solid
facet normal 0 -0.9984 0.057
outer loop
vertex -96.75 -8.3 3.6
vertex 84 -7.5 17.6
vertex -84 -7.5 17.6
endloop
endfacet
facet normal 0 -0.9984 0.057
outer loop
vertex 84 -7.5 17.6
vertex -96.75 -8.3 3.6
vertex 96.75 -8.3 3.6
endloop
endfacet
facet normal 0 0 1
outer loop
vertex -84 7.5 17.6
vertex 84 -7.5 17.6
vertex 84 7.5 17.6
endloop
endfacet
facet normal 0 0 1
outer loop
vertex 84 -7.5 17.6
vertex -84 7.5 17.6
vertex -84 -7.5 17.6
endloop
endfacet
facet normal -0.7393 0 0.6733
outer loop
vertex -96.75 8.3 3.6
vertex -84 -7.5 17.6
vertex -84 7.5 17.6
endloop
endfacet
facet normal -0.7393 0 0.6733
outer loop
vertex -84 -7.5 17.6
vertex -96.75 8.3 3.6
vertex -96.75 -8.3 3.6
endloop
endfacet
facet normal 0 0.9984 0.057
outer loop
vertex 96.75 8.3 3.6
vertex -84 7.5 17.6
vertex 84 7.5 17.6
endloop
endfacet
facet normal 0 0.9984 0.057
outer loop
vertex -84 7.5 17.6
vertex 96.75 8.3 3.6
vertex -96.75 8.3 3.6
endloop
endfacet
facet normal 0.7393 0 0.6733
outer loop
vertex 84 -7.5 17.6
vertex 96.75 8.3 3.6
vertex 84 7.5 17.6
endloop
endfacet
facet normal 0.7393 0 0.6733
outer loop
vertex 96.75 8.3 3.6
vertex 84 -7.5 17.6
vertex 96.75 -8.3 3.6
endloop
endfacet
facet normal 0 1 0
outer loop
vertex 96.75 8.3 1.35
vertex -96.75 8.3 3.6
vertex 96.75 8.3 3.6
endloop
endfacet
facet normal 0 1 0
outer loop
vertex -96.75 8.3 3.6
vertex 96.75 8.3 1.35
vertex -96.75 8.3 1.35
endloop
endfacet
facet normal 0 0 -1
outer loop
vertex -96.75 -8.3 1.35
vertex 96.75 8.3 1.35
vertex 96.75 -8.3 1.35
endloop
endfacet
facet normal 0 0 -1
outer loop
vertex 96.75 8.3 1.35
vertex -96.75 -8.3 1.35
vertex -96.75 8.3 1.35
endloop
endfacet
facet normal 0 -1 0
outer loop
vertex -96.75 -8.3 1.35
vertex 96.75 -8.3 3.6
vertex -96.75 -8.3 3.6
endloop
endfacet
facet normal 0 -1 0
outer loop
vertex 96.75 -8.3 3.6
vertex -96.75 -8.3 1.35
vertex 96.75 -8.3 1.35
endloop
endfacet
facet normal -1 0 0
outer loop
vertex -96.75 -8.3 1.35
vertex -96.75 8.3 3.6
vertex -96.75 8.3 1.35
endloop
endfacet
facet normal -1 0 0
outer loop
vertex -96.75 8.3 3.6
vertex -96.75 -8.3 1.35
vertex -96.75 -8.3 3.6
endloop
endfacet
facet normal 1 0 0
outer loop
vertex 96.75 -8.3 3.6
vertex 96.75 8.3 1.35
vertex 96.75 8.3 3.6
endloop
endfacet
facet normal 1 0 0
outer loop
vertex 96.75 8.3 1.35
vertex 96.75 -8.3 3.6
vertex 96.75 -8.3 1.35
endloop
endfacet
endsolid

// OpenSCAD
$fn = $preview ? 50 : 140;
EPSILON = 0.01;

module copy_mirror(vec) {
  children();
  mirror(vec) children();
}

module copy_rotate(vec) {
  children();
  rotate(vec) children();
}

LID_THICKNESS = 3.6;
LID_EDGE_THICKNESS = 1.35;
LID_DIAMETER = 249;
LID_CHAMFER_LENGTH = 5.4;
LID_CHAMFER_THICKNESS = LID_THICKNESS - LID_EDGE_THICKNESS;

HANDLE_BOTTOM_LENGTH = 193.5;
HANDLE_TOP_LENGTH = 168;
HANDLE_HEIGHT = 14;
HANDLE_BOTTOM_WIDTH = 16.6;
HANDLE_TOP_WIDTH = 15;
HANDLE_LENGTH_DIFF = (HANDLE_BOTTOM_LENGTH - HANDLE_TOP_LENGTH) / 2;
HANDLE_WIDTH_DIFF = (HANDLE_BOTTOM_WIDTH - HANDLE_TOP_WIDTH) / 2;

// Top lid
module lid() {
  cylinder(h = LID_EDGE_THICKNESS, d = LID_DIAMETER);
  translate([ 0, 0, LID_EDGE_THICKNESS ])
      cylinder(h = LID_THICKNESS, d1 = LID_DIAMETER,
               d2 = LID_DIAMETER - LID_CHAMFER_LENGTH * 2);
}

HandlePoints = [
  [ 0, 0, 0 ],                                               // 0
  [ 0, HANDLE_BOTTOM_LENGTH, 0 ],                            // 1
  [ HANDLE_BOTTOM_WIDTH, HANDLE_BOTTOM_LENGTH, 0 ],          // 2
  [ HANDLE_BOTTOM_WIDTH, 0, 0 ],                             // 3
  [ HANDLE_WIDTH_DIFF, HANDLE_LENGTH_DIFF, HANDLE_HEIGHT ],  // 4
  [
    HANDLE_WIDTH_DIFF, HANDLE_BOTTOM_LENGTH - HANDLE_LENGTH_DIFF,
    HANDLE_HEIGHT
  ],  // 5
  [
    HANDLE_TOP_WIDTH + HANDLE_WIDTH_DIFF,
    HANDLE_BOTTOM_LENGTH - HANDLE_LENGTH_DIFF,
    HANDLE_HEIGHT
  ],  // 6
  [ HANDLE_TOP_WIDTH + HANDLE_WIDTH_DIFF, HANDLE_LENGTH_DIFF, HANDLE_HEIGHT ]
];  // 7

HandleFaces = [
  [ 0, 1, 2, 3 ],  // bottom
  [ 4, 5, 1, 0 ],  // front
  [ 7, 6, 5, 4 ],  // top
  [ 5, 6, 2, 1 ],  // right
  [ 6, 7, 3, 2 ],  // back
  [ 7, 4, 0, 3 ]
];  // left

// Lid handle (inset into the lid so it can be super glued in place)
module handle() {
  translate([ 0, 0, LID_THICKNESS ]) {
    rotate([ 0, 0, 90 ]) {
      translate([ HANDLE_BOTTOM_WIDTH / -2, HANDLE_BOTTOM_LENGTH / -2, 0 ]) {
        polyhedron(HandlePoints, HandleFaces);
        translate([ 0, 0, -LID_CHAMFER_THICKNESS ]) cube([
          HANDLE_BOTTOM_WIDTH, HANDLE_BOTTOM_LENGTH,
          LID_CHAMFER_THICKNESS
        ]);
      }
    }
  }
}

BOTTOM_CIRCLE_THICKNESS = 2.6;
BOTTOM_CIRCLE_DIAMETER = 196;
BOTTOM_CIRCLE_INNER_DIAMETER =
    BOTTOM_CIRCLE_DIAMETER - BOTTOM_CIRCLE_THICKNESS * 2;
BOTTOM_CIRCLE_HEIGHT = 18;

BOTTOM_DIVIDER_LINE_THICKNESS = 1.9;
BOTTOM_DIVIDER_LINE_HEIGHT = 8.6;

module bottom_circle() {
  // bottom circle
  translate([ 0, 0, -BOTTOM_CIRCLE_HEIGHT / 2 ]) {
    difference() {
      cylinder(h = BOTTOM_CIRCLE_HEIGHT, d = BOTTOM_CIRCLE_DIAMETER,
               center = true);
      cylinder(h = BOTTOM_CIRCLE_HEIGHT + 0.01,
               d = BOTTOM_CIRCLE_INNER_DIAMETER, center = true);
    }
  }

  SMALL_TAB_OUTER_OFFSET = 17.8;
  SMALL_TAB_CENTER_OFFSET =
      BOTTOM_CIRCLE_INNER_DIAMETER / 2 - SMALL_TAB_OUTER_OFFSET;
  SMALL_TAB_LENGTH = 5.1;
  SMALL_TAB_HEIGHT = 13.6;

  // divider line
  difference() {
    translate([ 0, 0, -BOTTOM_DIVIDER_LINE_HEIGHT / 2 ]) {
      cube(
          [
            BOTTOM_DIVIDER_LINE_THICKNESS,
            BOTTOM_CIRCLE_DIAMETER - BOTTOM_CIRCLE_THICKNESS / 2,
            BOTTOM_DIVIDER_LINE_HEIGHT
          ],
          center = true);
    }
    // remove holes
    translate([ 0, 0, -CENTER_HOLE_HEIGHT / 2 ])
        cylinder(h = CENTER_HOLE_HEIGHT + 0.01, d = CENTER_HOLE_INNER_DIAMETER,
                 center = true);
    translate([ 0, SIDE_HOLE_CENTER_OFFSET, SIDE_HOLE_HEIGHT / -2 ])
        cylinder(h = SIDE_HOLE_HEIGHT + 0.01, d = SIDE_HOLE_INNER_DIAMETER,
                 center = true);
  }

  // Small tab next to side hole
  translate([
    0, SMALL_TAB_LENGTH / -2 + SMALL_TAB_CENTER_OFFSET, SMALL_TAB_HEIGHT / -2
  ]) cube([ BOTTOM_DIVIDER_LINE_THICKNESS, SMALL_TAB_LENGTH, SMALL_TAB_HEIGHT ],
          center = true);

  CENTER_HOLE_DIAMETER = 8.46;
  CENTER_HOLE_INNER_DIAMETER = 3.35;
  CENTER_HOLE_HEIGHT = 12.5;

  translate([ 0, 0, -CENTER_HOLE_HEIGHT / 2 ]) {
    difference() {
      cylinder(h = CENTER_HOLE_HEIGHT, d = CENTER_HOLE_DIAMETER, center = true);
      cylinder(h = CENTER_HOLE_HEIGHT + 0.01, d = CENTER_HOLE_INNER_DIAMETER,
               center = true);
    }
  }

  SIDE_HOLE_OUTER_OFFSET = 25.2;
  SIDE_HOLE_CENTER_OFFSET =
      BOTTOM_CIRCLE_INNER_DIAMETER / 2 - SIDE_HOLE_OUTER_OFFSET;
  SIDE_HOLE_DIAMETER = 8;
  SIDE_HOLE_INNER_DIAMETER = 3.35;
  SIDE_HOLE_HEIGHT = 12.29;

  translate([ 0, SIDE_HOLE_CENTER_OFFSET, SIDE_HOLE_HEIGHT / -2 ])
      difference() {
    cylinder(h = SIDE_HOLE_HEIGHT, d = SIDE_HOLE_DIAMETER, center = true);
    cylinder(h = SIDE_HOLE_HEIGHT + 0.01, d = SIDE_HOLE_INNER_DIAMETER,
             center = true);
  }

  // 4x locking tabs

  LOCK_TAB_WIDTH = 10.6;
  LOCK_TAB_EXTRUSION_WIDTH = LOCK_TAB_WIDTH * 5;
  LOCK_TAB_THICKNESS = 2.5;
  LOCK_TAB_LEFT_HEIGHT = 5;
  LOCK_TAB_LEFT_LENGTH = 4.2;

  LOCK_TAB_LEFT_MAX_Z = 8.03;
  LOCK_TAB_MIDDLE_MAX_Z = 6.3;
  LOCK_TAB_MIDDLE_Z_OFFSET = LOCK_TAB_LEFT_MAX_Z - LOCK_TAB_MIDDLE_MAX_Z;

  LOCK_TAB_MIDDLE_LENGTH = 54;
  LOCK_TAB_RIGHT_MAX_Z = 4.4;
  LOCK_TAB_RIGHT_LENGTH = 9.9;

  LOCK_TAB_RIGHT_Z_OFFSET = LOCK_TAB_MIDDLE_MAX_Z - LOCK_TAB_RIGHT_MAX_Z;

  LOCK_TAB_MIDDLE_X1 = LOCK_TAB_LEFT_LENGTH;
  LOCK_TAB_MIDDLE_X2 = LOCK_TAB_MIDDLE_X1 + LOCK_TAB_MIDDLE_LENGTH;
  LOCK_TAB_MIDDLE_Y1 = LOCK_TAB_LEFT_HEIGHT;
  LOCK_TAB_MIDDLE_Y2 = LOCK_TAB_MIDDLE_Y1 + LOCK_TAB_MIDDLE_Z_OFFSET;

  LOCK_TAB_RIGHT_X1 = LOCK_TAB_MIDDLE_X1 + LOCK_TAB_MIDDLE_LENGTH;
  LOCK_TAB_RIGHT_X2 = LOCK_TAB_RIGHT_X1 + LOCK_TAB_RIGHT_LENGTH;
  LOCK_TAB_RIGHT_Y1 = LOCK_TAB_MIDDLE_Y2;
  LOCK_TAB_RIGHT_Y2 = LOCK_TAB_RIGHT_Y1 + LOCK_TAB_RIGHT_Z_OFFSET;
  // rotate([ 90, 0, 0 ]) square(size = [ 20, 40 ], center = true);

  LOCK_TAB_Z_OFFSET = 4.2;

  LOCK_TAB_TOTAL_LENGTH =
      LOCK_TAB_LEFT_LENGTH + LOCK_TAB_MIDDLE_LENGTH + LOCK_TAB_RIGHT_LENGTH;

  copy_rotate([ 0, 0, 180 ]) copy_rotate([ 0, 0, 90 ]) intersection() {
    translate([
      0, BOTTOM_CIRCLE_INNER_DIAMETER / 2, -LOCK_TAB_Z_OFFSET
    ]) mirror([ 1, 0, 0 ]) translate([ 0, LOCK_TAB_EXTRUSION_WIDTH / 2,
                                       0 ]) rotate([ 90, 180, 0 ])
        linear_extrude(height = LOCK_TAB_EXTRUSION_WIDTH) polygon(points = [
          [ 0, 0 ],                     // bottom left
          [ 0, LOCK_TAB_LEFT_HEIGHT ],  // top left
          [
            LOCK_TAB_MIDDLE_X1, LOCK_TAB_MIDDLE_Y1
          ],  // top left of middle part
          [
            LOCK_TAB_MIDDLE_X2, LOCK_TAB_MIDDLE_Y2
          ],                                         // top right of middle part
          [ LOCK_TAB_RIGHT_X1, LOCK_TAB_RIGHT_Y1 ],  // top left of right part
          [ LOCK_TAB_RIGHT_X2, LOCK_TAB_RIGHT_Y2 ],  // top right of right part
          [
            LOCK_TAB_RIGHT_X2, LOCK_TAB_RIGHT_Y2 - LOCK_TAB_THICKNESS
          ],  // bottom right of right part
          [
            LOCK_TAB_RIGHT_X1, LOCK_TAB_RIGHT_Y1 - LOCK_TAB_THICKNESS
          ],  // bottom left of right part

          [
            LOCK_TAB_MIDDLE_X1, LOCK_TAB_MIDDLE_Y1 - LOCK_TAB_THICKNESS
          ],                         // bottom left of middle part
          [ LOCK_TAB_MIDDLE_X1, 0 ]  // bottom right of left part
        ]);

    // Constrain lock tabs to this circular area around the center
    translate([ 0, 0, -BOTTOM_CIRCLE_HEIGHT / 2 ]) difference() {
      cylinder(h = BOTTOM_CIRCLE_HEIGHT,
               d = BOTTOM_CIRCLE_DIAMETER + LOCK_TAB_WIDTH * 2, center = true);
      cylinder(h = BOTTOM_CIRCLE_HEIGHT + 0.01,
               d = BOTTOM_CIRCLE_INNER_DIAMETER, center = true);
    }
  }
}

// difference() {
//   lid();
//   scale([ 1.01, 1.01, 1.01 ]) handle();
// }
// bottom_circle();
handle();
